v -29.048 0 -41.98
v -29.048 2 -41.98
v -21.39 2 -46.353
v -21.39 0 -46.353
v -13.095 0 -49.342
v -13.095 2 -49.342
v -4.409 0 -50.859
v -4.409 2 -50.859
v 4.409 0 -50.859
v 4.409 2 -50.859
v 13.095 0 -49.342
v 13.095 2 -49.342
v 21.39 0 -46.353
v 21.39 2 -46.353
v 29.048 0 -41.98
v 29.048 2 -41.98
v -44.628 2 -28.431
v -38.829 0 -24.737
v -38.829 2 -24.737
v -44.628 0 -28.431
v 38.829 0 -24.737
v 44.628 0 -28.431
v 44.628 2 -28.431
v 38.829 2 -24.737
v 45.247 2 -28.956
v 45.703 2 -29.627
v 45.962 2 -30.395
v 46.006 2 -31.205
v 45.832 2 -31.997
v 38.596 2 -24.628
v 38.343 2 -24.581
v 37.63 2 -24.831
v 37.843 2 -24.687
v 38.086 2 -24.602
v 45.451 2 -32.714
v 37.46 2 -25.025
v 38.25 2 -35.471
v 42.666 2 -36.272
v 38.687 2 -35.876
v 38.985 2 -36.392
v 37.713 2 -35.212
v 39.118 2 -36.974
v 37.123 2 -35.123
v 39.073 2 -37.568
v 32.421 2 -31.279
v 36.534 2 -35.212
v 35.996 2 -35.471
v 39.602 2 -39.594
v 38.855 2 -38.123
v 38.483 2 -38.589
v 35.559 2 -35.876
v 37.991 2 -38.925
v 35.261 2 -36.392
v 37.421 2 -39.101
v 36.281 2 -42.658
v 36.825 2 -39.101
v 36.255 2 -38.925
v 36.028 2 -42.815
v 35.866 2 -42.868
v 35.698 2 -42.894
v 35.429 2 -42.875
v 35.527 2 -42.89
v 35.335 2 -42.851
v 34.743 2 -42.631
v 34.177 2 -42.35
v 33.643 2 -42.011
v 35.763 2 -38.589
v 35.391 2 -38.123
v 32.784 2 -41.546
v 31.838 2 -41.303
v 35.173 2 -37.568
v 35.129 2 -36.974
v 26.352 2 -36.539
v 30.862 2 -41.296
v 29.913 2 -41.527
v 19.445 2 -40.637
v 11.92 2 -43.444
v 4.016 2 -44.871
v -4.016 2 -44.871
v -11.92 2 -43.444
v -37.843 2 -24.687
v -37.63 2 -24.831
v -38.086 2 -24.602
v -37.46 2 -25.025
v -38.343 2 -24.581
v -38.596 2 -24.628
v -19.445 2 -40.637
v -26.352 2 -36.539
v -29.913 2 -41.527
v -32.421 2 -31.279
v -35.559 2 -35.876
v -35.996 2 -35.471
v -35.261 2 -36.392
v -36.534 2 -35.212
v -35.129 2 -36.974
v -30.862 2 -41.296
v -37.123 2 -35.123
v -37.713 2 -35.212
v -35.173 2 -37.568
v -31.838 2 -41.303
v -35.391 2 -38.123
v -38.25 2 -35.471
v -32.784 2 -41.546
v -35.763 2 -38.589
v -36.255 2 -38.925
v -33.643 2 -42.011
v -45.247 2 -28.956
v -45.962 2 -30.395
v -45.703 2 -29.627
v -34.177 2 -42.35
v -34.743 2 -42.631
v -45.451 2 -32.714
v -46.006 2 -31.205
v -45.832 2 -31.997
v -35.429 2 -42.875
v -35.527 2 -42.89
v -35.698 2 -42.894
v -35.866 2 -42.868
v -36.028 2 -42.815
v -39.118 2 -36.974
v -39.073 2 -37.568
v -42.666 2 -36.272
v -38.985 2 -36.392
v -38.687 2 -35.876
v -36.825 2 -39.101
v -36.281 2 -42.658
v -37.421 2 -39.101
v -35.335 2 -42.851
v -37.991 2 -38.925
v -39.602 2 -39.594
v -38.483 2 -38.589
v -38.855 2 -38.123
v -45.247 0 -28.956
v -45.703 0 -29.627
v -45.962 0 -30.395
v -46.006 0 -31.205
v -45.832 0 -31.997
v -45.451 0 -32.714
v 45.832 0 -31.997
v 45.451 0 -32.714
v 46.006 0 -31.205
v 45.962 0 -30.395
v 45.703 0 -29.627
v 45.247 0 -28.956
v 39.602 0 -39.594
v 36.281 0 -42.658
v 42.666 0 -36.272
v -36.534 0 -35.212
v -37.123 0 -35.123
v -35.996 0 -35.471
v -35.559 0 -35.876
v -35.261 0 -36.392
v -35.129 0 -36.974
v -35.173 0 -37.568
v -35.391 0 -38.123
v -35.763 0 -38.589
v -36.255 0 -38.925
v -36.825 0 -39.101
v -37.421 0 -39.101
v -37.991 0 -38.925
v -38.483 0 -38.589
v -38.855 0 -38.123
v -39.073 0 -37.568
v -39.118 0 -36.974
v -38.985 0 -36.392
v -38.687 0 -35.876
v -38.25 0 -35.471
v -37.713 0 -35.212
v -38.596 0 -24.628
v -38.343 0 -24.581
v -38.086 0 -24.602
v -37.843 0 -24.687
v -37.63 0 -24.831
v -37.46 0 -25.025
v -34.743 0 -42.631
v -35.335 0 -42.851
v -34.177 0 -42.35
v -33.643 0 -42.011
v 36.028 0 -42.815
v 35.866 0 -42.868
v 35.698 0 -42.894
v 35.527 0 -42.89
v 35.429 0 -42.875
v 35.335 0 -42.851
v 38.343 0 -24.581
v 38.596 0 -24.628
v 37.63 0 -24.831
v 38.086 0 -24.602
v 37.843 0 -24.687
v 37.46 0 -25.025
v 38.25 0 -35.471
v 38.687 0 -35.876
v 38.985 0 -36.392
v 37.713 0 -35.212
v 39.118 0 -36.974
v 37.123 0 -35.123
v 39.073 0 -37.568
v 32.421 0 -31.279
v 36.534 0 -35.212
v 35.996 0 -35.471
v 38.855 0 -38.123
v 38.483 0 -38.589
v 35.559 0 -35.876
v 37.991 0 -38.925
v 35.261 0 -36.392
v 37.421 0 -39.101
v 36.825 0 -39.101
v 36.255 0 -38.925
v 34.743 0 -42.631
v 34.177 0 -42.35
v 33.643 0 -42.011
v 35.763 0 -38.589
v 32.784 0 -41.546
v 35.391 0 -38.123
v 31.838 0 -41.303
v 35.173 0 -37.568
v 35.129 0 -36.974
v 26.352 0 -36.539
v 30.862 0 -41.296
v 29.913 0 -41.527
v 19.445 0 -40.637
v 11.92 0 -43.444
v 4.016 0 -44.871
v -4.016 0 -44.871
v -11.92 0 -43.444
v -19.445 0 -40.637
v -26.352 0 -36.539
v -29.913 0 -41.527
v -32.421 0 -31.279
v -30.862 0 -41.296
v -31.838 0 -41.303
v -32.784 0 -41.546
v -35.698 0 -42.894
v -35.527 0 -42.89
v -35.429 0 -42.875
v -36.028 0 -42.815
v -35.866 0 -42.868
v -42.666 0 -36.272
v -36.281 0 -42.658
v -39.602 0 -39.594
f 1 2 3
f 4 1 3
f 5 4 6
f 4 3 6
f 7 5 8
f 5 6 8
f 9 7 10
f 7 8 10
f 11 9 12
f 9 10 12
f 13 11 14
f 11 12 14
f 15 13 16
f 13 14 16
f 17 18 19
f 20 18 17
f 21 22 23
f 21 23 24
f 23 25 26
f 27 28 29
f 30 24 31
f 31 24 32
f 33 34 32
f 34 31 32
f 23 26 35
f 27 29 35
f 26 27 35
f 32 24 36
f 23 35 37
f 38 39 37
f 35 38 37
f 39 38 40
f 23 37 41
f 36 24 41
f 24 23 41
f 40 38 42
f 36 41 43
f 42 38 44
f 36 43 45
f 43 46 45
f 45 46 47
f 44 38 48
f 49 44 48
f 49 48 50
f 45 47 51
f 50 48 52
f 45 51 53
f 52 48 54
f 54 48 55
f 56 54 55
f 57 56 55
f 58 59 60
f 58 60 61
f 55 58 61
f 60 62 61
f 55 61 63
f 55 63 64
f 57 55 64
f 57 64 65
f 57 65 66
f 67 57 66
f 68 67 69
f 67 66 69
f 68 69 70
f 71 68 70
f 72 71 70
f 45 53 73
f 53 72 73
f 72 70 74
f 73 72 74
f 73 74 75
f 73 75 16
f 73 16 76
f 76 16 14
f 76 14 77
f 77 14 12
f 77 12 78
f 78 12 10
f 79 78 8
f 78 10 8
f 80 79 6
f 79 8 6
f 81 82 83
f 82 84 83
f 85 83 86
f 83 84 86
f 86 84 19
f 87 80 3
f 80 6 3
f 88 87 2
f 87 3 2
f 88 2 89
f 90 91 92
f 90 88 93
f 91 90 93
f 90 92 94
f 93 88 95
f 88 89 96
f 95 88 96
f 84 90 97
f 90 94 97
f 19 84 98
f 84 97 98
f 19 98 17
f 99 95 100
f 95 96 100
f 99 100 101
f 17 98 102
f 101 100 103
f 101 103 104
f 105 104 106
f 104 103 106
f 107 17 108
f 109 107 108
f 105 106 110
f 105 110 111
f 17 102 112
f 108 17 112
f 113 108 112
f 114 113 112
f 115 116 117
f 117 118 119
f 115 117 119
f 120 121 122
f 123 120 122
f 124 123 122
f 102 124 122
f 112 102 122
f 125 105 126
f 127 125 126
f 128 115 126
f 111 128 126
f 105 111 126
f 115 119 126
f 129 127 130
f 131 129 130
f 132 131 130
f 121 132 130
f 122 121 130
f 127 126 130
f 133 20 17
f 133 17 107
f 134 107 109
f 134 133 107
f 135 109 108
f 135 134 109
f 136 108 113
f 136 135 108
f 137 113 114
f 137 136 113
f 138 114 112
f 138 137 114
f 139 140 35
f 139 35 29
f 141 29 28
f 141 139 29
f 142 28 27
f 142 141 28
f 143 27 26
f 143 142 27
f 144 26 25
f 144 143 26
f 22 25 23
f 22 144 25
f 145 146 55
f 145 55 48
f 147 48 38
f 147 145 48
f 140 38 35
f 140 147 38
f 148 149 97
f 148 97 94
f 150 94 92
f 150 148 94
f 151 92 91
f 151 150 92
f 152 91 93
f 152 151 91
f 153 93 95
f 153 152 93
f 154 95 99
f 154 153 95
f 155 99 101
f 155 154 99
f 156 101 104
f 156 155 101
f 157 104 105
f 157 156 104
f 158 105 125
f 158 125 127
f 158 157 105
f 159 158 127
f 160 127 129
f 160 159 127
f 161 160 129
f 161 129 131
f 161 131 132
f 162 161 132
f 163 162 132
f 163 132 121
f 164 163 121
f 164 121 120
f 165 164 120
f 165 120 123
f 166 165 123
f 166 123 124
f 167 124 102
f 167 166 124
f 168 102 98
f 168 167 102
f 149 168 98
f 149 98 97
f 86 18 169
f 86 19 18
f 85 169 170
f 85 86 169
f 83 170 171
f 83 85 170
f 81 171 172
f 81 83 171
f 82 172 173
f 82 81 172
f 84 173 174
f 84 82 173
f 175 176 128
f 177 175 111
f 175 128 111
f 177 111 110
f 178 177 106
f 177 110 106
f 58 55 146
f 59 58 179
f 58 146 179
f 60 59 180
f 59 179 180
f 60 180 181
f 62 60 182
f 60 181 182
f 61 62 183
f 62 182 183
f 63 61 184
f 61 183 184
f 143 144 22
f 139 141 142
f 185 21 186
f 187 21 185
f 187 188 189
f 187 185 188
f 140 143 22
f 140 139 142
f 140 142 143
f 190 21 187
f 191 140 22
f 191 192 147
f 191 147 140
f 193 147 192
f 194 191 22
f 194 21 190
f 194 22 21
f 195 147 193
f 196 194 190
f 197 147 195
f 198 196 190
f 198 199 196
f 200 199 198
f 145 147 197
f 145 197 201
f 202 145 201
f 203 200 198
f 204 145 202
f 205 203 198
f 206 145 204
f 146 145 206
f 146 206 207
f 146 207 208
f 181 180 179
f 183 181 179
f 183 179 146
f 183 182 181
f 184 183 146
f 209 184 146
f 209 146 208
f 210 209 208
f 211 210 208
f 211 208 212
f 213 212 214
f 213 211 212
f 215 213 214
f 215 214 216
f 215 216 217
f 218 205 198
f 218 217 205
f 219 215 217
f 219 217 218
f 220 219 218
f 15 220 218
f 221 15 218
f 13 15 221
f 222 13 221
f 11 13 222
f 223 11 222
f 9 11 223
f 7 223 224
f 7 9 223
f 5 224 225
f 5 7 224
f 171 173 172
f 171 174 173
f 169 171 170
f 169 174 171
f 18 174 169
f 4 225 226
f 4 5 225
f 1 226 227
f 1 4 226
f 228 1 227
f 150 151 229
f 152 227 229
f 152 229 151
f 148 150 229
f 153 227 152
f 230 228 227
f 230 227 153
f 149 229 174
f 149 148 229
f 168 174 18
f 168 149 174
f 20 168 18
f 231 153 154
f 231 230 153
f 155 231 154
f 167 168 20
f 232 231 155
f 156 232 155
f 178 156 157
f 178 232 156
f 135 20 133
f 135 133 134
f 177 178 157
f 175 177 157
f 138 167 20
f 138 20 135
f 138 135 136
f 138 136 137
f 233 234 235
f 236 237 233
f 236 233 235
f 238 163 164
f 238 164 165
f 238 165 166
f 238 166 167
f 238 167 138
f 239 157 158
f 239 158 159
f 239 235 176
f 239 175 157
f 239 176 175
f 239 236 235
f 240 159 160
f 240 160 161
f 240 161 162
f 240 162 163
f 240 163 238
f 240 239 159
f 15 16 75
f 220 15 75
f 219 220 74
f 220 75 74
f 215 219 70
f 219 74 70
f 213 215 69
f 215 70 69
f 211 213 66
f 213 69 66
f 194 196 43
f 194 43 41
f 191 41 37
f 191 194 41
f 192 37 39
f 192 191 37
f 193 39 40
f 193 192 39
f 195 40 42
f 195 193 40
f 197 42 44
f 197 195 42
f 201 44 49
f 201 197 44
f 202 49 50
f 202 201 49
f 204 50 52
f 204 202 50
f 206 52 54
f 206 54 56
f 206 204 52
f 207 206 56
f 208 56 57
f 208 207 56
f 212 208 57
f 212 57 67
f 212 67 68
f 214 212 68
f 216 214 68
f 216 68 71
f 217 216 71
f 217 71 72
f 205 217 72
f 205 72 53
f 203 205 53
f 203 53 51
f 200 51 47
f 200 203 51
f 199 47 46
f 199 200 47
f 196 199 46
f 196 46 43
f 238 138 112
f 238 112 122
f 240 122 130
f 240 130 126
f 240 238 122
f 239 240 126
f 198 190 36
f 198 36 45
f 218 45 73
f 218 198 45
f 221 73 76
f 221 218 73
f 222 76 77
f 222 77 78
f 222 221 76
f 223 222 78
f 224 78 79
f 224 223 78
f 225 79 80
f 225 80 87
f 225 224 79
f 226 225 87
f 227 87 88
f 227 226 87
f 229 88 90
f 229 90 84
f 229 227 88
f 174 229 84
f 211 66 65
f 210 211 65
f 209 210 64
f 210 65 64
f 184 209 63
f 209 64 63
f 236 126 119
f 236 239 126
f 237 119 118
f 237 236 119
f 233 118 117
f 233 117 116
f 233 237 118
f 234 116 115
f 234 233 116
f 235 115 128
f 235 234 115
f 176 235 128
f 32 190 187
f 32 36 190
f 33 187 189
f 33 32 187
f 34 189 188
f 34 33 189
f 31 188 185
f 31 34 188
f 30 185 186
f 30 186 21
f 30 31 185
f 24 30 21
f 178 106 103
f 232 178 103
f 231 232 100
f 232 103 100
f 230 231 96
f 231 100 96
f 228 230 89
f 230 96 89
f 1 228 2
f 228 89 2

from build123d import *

# Parameters (mm, degrees)
SKETCH_1_R          = 2
EXTRUDE_1_DEPTH     = 2
CUT_EXTRUDE_1_DEPTH = 73.508544139
FILLET_1_R          = 1


with BuildPart() as part:
    # 草图1 → 凸台-拉伸1 (new body)
    with BuildSketch(Plane(origin=(0, 0, 0), x_dir=(1, 0, 0), z_dir=(0, 1, 0))):
        with BuildLine():
            Line((-37.994784634, 24.205347356), (-44.62808047, 28.431222864))
            ThreePointArc((-44.62808047, 28.431222864), (-45.962279794, 30.395264974), (-45.451059851, 32.713929119))
            ThreePointArc((-45.451059851, 32.713929119), (0, 56), (45.451059851, 32.713929119))
            ThreePointArc((45.451059851, 32.713929119), (45.962279794, 30.395264974), (44.62808047, 28.431222864))
            Line((44.62808047, 28.431222864), (37.994784634, 24.205347356))
            ThreePointArc((37.994784634, 24.205347356), (0, 45.05), (-37.994784634, 24.205347356))
        make_face()
        with Locations(Location((37.123106012, 37.123106012, 0), (0, 0, 270))):
            Circle(SKETCH_1_R, mode=Mode.SUBTRACT)
        with Locations(Location((-37.123106012, 37.123106012, 0), (0, 0, 270))):
            Circle(SKETCH_1_R, mode=Mode.SUBTRACT)
    extrude(amount=EXTRUDE_1_DEPTH)

    # 草图2 → 切除-拉伸1 (cut, through all)
    with BuildSketch(Plane(origin=(0, 2, 0), x_dir=(1, 0, 0), z_dir=(0, 1, 0))):
        with BuildLine():
            ThreePointArc((-29.047558943, 41.980255114), (0, 51.05), (29.047558943, 41.980255114))
            ThreePointArc((29.047558943, 41.980255114), (31.350327582, 41.269688809), (33.643382893, 42.011001982))
            ThreePointArc((33.643382893, 42.011001982), (34.712414977, 42.617518513), (35.882608489, 42.993469365))
            ThreePointArc((35.882608489, 42.993469365), (0, 56), (-35.882608489, 42.993469365))
            ThreePointArc((-35.882608489, 42.993469365), (-34.712414977, 42.617518513), (-33.643382893, 42.011001982))
            ThreePointArc((-33.643382893, 42.011001982), (-31.350327582, 41.269688809), (-29.047558943, 41.980255114))
        make_face()
    extrude(amount=-CUT_EXTRUDE_1_DEPTH, mode=Mode.SUBTRACT)

    # 圆角1
    fillet_1_edges = [part.edges().sort_by_distance(p)[0] for p in [
        (-37.994784634, 1, -24.205347356),
        (37.994784634, 1, -24.205347356),
        (-35.882608489, 1, -42.993469365),
        (35.882608489, 1, -42.993469365),
    ]]
    fillet(fillet_1_edges, radius=FILLET_1_R)


solid = part.part
